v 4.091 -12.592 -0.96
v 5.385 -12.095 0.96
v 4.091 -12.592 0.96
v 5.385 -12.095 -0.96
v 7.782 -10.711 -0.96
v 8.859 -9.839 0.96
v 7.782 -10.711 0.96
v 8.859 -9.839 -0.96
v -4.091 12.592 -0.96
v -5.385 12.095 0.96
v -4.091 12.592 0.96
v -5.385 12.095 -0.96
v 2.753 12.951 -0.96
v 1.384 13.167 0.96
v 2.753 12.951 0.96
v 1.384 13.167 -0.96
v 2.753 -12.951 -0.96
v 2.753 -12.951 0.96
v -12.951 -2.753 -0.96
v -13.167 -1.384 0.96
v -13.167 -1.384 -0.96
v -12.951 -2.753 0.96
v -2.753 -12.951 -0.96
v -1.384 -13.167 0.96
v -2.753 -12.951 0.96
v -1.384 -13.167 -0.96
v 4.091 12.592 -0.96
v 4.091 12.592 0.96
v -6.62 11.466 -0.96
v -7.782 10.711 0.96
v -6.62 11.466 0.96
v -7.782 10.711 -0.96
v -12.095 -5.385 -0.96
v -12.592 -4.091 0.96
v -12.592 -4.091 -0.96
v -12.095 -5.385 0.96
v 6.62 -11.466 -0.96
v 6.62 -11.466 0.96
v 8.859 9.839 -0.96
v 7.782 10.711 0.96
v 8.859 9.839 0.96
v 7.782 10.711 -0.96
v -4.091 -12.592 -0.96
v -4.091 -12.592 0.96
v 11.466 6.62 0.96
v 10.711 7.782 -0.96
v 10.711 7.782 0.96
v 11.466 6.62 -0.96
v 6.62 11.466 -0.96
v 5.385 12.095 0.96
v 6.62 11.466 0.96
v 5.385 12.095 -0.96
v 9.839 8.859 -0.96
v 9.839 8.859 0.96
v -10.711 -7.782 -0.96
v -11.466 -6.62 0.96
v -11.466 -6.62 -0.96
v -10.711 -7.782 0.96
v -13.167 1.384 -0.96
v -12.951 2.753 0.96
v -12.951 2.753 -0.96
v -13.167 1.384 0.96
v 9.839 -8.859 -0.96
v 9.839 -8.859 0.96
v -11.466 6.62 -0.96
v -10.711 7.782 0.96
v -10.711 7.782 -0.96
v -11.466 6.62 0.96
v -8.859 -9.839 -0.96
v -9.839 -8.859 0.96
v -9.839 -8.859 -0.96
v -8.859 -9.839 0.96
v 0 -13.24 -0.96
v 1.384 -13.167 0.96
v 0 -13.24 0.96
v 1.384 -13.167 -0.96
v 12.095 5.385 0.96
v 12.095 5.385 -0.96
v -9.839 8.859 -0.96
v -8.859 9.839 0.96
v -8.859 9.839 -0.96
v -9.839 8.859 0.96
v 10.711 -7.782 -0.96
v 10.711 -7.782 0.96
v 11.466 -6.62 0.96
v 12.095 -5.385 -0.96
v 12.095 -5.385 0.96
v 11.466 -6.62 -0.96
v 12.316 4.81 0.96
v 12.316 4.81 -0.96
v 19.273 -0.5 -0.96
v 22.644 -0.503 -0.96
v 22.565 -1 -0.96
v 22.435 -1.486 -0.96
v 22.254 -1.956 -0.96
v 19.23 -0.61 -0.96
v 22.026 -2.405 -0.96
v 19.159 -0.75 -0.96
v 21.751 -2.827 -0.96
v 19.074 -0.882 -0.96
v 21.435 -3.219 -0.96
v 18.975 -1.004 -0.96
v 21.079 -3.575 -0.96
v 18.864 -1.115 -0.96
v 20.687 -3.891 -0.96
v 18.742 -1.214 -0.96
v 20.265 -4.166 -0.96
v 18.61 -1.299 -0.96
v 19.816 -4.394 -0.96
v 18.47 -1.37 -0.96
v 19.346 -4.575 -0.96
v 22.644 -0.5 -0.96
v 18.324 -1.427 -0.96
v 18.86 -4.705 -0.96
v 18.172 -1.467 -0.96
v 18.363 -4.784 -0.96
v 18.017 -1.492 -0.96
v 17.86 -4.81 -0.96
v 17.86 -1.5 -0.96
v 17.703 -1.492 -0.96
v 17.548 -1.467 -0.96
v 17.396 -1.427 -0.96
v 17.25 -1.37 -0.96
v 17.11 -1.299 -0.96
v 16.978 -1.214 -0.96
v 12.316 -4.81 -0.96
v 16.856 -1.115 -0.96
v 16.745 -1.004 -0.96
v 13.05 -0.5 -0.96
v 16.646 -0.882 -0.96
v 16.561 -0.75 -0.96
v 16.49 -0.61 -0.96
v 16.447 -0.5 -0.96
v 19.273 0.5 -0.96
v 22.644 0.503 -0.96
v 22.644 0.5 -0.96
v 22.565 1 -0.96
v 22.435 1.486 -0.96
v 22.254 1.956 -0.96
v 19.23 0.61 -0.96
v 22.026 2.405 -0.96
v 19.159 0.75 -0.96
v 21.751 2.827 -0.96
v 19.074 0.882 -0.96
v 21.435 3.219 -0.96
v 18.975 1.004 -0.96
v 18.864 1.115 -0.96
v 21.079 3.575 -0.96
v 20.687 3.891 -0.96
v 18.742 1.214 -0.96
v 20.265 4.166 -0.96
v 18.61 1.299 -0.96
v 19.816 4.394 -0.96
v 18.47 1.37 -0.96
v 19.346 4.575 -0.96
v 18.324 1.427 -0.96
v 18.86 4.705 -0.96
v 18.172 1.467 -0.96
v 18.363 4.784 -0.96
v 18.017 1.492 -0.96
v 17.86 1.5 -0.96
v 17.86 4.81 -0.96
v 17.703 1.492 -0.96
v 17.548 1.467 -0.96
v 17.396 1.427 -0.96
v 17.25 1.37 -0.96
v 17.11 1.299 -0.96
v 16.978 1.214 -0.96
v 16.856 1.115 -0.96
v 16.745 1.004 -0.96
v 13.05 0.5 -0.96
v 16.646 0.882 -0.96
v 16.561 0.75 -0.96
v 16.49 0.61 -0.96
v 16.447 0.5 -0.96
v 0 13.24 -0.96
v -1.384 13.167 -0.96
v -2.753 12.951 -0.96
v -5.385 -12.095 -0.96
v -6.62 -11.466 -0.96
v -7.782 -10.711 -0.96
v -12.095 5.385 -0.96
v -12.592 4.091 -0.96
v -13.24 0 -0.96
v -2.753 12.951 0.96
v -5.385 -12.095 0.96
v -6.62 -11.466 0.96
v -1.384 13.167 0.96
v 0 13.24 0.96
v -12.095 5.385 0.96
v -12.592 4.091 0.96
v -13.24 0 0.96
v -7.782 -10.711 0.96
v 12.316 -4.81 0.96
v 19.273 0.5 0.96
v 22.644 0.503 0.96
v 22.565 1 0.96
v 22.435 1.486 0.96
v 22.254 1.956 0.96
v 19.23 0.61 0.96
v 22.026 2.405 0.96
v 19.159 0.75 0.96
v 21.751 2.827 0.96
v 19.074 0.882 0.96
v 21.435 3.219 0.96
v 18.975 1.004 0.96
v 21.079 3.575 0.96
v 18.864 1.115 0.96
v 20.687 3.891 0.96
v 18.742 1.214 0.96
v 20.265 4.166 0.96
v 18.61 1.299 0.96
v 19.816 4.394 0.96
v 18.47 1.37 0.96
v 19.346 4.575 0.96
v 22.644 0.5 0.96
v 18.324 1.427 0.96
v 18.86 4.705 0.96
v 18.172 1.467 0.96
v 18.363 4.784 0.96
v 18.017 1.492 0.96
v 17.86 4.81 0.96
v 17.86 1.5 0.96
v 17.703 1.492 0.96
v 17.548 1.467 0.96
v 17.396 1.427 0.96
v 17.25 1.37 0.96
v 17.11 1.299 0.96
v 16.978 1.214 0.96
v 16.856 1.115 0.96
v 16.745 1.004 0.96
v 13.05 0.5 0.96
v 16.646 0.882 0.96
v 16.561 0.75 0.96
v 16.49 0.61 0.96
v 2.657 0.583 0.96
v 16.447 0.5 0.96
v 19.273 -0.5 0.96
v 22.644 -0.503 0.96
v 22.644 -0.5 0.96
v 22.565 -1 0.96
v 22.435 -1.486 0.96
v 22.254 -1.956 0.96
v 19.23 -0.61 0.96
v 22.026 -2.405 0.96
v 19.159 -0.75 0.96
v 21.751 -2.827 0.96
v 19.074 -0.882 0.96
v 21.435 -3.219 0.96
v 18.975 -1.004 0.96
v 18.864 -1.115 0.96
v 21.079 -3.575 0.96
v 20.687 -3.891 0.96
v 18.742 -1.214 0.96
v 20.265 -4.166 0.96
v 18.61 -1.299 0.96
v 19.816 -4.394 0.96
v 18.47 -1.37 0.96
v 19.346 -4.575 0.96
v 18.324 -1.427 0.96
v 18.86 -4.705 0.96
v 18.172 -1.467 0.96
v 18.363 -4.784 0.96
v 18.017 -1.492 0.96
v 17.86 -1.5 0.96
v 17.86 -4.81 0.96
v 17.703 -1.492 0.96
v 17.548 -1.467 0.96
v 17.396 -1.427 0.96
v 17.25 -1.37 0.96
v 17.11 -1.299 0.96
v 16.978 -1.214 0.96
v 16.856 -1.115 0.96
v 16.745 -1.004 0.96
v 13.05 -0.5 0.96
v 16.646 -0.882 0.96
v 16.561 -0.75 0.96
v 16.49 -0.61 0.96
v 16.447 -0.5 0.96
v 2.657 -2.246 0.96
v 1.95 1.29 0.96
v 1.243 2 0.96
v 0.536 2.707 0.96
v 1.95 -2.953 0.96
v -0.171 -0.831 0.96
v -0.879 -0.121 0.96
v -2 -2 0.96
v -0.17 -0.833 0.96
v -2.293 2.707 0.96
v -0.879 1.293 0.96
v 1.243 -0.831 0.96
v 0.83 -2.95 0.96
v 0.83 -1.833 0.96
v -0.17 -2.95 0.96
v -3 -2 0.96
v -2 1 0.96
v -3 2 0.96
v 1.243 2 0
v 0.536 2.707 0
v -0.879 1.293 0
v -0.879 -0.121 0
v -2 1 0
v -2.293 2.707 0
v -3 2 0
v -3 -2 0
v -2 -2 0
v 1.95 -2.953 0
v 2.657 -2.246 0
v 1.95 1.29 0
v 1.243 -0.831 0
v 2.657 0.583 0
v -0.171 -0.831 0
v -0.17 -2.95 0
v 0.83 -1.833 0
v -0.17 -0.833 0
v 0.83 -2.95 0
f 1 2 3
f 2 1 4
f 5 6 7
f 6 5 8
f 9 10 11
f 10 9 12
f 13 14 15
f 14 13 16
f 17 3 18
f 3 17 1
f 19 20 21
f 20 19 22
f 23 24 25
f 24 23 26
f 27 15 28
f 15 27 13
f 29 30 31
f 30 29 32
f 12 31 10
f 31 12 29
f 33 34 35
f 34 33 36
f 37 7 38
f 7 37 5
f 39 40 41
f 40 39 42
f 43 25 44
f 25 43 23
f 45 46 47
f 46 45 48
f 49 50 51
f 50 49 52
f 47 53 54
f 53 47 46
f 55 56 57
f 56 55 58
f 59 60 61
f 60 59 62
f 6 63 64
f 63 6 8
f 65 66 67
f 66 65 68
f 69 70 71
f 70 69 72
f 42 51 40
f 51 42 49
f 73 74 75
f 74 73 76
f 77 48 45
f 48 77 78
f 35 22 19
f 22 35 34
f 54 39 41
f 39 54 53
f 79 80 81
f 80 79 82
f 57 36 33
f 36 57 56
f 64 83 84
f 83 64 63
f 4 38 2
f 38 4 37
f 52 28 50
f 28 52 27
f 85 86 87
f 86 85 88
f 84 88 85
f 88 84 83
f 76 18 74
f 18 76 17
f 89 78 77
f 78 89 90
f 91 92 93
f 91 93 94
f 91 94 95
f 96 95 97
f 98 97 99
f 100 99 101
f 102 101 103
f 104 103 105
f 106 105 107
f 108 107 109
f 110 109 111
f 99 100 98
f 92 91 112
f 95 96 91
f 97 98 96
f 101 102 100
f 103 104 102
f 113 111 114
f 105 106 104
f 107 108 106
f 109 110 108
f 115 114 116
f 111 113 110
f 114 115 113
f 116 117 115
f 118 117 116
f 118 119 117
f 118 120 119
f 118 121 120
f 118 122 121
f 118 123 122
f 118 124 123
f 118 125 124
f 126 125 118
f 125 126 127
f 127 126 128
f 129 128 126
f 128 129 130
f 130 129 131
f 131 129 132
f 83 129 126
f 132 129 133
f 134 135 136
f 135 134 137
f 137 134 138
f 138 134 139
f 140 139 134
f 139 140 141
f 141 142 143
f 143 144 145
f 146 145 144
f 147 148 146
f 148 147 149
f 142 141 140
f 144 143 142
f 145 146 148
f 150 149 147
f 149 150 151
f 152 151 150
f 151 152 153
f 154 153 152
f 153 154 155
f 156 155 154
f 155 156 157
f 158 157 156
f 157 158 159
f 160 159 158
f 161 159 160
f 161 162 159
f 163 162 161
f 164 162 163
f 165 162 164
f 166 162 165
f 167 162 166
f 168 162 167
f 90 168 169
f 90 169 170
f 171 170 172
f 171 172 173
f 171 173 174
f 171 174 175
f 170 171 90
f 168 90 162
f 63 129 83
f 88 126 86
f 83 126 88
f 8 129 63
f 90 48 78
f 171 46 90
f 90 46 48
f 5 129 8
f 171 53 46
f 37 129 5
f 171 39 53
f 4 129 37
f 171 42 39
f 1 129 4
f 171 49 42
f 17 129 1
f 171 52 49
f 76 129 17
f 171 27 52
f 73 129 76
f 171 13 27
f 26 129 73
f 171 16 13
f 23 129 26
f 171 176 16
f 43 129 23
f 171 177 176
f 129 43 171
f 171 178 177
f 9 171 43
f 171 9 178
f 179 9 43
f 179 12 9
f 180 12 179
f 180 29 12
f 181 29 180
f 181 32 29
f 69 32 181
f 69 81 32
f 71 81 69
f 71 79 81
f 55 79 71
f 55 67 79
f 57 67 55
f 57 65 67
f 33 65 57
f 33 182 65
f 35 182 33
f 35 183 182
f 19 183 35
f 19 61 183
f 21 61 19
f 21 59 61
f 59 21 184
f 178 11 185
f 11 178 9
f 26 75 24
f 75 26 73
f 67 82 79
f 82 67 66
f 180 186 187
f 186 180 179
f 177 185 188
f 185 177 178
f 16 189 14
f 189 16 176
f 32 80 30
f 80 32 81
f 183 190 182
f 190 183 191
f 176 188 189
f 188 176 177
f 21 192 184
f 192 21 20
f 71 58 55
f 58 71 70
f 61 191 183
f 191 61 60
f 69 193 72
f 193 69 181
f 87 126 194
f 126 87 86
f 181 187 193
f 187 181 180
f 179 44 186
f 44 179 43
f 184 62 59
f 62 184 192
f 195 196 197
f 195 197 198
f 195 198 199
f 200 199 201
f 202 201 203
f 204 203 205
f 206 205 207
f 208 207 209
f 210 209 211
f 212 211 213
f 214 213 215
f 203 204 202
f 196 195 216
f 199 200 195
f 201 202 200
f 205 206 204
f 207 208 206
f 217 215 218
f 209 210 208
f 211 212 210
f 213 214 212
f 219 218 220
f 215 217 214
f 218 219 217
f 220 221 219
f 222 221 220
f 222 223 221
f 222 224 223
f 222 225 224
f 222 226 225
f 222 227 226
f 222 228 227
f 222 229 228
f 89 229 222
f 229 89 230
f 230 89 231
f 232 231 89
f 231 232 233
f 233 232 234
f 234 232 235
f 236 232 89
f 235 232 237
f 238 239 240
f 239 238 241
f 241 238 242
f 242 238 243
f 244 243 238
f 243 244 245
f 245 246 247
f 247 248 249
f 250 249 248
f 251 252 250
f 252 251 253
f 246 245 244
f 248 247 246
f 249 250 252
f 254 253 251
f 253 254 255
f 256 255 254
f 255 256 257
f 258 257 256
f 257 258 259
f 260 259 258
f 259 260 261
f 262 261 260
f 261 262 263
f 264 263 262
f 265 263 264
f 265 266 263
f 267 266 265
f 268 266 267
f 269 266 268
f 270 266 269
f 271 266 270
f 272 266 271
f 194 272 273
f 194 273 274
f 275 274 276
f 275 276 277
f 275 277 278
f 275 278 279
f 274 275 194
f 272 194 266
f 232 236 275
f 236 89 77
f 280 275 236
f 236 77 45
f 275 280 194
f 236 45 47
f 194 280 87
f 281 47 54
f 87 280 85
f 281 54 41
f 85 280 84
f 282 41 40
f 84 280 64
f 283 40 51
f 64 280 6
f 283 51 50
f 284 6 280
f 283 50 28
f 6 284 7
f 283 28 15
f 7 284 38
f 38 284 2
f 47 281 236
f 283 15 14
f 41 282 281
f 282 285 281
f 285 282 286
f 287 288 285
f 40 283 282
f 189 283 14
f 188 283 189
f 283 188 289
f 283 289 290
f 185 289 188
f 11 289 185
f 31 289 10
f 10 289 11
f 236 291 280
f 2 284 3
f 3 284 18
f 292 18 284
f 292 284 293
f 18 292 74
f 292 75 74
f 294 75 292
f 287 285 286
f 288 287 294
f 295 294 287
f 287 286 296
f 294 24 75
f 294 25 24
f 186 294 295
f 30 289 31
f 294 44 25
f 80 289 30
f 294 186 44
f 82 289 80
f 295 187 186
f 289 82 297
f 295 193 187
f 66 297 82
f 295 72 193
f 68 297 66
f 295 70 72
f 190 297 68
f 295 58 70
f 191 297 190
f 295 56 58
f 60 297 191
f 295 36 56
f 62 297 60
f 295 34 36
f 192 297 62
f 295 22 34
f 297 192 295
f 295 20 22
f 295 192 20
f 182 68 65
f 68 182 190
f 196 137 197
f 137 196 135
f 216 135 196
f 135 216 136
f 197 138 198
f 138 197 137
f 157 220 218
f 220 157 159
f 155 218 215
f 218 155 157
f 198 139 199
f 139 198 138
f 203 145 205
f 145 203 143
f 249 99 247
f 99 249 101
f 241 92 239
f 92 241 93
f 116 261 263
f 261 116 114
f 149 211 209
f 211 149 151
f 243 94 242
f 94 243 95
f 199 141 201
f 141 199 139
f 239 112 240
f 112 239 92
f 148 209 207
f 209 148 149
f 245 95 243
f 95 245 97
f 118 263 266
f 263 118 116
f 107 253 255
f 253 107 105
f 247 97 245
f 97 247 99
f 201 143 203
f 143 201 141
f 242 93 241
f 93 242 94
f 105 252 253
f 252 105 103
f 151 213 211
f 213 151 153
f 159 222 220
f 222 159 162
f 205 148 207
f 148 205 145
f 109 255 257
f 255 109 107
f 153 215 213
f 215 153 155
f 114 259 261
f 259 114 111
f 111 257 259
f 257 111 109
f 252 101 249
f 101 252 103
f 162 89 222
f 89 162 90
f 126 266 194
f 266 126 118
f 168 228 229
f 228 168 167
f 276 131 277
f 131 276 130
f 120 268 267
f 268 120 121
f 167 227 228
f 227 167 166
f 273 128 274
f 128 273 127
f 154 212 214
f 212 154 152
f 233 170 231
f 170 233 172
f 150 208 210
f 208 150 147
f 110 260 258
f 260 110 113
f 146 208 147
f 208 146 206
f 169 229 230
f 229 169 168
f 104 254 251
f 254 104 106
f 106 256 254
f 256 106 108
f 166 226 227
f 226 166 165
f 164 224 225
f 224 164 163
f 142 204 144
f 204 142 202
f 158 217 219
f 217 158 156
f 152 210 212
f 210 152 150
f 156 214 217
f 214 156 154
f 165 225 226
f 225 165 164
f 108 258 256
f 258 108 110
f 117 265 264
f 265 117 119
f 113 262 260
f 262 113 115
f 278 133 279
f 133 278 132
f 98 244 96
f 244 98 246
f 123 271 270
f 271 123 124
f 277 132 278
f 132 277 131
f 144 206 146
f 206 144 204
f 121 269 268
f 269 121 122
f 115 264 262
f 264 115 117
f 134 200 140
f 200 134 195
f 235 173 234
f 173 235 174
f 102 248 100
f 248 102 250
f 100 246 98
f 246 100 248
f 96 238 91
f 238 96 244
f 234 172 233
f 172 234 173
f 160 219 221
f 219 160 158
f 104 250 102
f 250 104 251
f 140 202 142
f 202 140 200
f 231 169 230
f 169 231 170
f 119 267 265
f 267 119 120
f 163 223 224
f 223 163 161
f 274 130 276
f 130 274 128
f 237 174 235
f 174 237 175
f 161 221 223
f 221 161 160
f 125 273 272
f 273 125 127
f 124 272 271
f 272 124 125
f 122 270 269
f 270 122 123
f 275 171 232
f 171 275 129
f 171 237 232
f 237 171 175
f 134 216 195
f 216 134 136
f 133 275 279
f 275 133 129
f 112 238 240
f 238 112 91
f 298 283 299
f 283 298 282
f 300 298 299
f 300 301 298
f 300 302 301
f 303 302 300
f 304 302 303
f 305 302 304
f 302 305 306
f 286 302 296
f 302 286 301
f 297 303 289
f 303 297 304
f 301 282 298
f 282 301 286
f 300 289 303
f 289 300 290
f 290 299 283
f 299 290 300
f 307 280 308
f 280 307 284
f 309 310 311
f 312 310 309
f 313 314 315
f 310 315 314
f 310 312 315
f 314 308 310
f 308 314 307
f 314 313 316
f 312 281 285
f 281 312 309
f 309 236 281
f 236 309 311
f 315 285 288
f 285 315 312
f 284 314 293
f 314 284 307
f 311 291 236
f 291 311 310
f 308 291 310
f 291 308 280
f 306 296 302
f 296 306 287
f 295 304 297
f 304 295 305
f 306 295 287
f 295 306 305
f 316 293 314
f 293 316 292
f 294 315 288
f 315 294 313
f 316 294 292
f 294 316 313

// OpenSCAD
Diameter=26.48;
Thickness=1.92;
RingDia=3;
SlotThick=1;
$fn=60;

difference(){
    union(){
        cylinder(d=Diameter,h=Thickness,center=true);
        translate([3*Diameter/4-2,0,0])cylinder(d=Diameter/4+RingDia,h=Thickness,center=true);
        translate([Diameter/2-2,0,0])cube([Diameter/2,Diameter/4+RingDia,Thickness], center=true);
    }
    translate([3*Diameter/4-2,0,0]){
        union(){
            cylinder(d=RingDia,h=Thickness*2,center=true);
            cube([Diameter/4+RingDia,SlotThick,Thickness*2],center=true);
            
        }
        translate([-3*Diameter/4-1,-2,0])Signature();
    }
}


module Signature(){
    cube([1,4,1]);
    translate([0,4,0]){
        rotate([0,0,45])translate([0,-3,0]){
            difference(){
                cube([3,3,1]);
                translate([1,1,-1])cube([3,3,3]);
            }
        }
    }
    translate([4.95,3.29,0]){
        rotate([0,0,-45])translate([0,-3,0]){
            difference(){
                cube([3,3,1]);
                translate([1,1,-1])cube([3,3,3]);
            }
        }
    }
    translate([2.83,-0.95,0])cube([1,2.12,1]);
}
